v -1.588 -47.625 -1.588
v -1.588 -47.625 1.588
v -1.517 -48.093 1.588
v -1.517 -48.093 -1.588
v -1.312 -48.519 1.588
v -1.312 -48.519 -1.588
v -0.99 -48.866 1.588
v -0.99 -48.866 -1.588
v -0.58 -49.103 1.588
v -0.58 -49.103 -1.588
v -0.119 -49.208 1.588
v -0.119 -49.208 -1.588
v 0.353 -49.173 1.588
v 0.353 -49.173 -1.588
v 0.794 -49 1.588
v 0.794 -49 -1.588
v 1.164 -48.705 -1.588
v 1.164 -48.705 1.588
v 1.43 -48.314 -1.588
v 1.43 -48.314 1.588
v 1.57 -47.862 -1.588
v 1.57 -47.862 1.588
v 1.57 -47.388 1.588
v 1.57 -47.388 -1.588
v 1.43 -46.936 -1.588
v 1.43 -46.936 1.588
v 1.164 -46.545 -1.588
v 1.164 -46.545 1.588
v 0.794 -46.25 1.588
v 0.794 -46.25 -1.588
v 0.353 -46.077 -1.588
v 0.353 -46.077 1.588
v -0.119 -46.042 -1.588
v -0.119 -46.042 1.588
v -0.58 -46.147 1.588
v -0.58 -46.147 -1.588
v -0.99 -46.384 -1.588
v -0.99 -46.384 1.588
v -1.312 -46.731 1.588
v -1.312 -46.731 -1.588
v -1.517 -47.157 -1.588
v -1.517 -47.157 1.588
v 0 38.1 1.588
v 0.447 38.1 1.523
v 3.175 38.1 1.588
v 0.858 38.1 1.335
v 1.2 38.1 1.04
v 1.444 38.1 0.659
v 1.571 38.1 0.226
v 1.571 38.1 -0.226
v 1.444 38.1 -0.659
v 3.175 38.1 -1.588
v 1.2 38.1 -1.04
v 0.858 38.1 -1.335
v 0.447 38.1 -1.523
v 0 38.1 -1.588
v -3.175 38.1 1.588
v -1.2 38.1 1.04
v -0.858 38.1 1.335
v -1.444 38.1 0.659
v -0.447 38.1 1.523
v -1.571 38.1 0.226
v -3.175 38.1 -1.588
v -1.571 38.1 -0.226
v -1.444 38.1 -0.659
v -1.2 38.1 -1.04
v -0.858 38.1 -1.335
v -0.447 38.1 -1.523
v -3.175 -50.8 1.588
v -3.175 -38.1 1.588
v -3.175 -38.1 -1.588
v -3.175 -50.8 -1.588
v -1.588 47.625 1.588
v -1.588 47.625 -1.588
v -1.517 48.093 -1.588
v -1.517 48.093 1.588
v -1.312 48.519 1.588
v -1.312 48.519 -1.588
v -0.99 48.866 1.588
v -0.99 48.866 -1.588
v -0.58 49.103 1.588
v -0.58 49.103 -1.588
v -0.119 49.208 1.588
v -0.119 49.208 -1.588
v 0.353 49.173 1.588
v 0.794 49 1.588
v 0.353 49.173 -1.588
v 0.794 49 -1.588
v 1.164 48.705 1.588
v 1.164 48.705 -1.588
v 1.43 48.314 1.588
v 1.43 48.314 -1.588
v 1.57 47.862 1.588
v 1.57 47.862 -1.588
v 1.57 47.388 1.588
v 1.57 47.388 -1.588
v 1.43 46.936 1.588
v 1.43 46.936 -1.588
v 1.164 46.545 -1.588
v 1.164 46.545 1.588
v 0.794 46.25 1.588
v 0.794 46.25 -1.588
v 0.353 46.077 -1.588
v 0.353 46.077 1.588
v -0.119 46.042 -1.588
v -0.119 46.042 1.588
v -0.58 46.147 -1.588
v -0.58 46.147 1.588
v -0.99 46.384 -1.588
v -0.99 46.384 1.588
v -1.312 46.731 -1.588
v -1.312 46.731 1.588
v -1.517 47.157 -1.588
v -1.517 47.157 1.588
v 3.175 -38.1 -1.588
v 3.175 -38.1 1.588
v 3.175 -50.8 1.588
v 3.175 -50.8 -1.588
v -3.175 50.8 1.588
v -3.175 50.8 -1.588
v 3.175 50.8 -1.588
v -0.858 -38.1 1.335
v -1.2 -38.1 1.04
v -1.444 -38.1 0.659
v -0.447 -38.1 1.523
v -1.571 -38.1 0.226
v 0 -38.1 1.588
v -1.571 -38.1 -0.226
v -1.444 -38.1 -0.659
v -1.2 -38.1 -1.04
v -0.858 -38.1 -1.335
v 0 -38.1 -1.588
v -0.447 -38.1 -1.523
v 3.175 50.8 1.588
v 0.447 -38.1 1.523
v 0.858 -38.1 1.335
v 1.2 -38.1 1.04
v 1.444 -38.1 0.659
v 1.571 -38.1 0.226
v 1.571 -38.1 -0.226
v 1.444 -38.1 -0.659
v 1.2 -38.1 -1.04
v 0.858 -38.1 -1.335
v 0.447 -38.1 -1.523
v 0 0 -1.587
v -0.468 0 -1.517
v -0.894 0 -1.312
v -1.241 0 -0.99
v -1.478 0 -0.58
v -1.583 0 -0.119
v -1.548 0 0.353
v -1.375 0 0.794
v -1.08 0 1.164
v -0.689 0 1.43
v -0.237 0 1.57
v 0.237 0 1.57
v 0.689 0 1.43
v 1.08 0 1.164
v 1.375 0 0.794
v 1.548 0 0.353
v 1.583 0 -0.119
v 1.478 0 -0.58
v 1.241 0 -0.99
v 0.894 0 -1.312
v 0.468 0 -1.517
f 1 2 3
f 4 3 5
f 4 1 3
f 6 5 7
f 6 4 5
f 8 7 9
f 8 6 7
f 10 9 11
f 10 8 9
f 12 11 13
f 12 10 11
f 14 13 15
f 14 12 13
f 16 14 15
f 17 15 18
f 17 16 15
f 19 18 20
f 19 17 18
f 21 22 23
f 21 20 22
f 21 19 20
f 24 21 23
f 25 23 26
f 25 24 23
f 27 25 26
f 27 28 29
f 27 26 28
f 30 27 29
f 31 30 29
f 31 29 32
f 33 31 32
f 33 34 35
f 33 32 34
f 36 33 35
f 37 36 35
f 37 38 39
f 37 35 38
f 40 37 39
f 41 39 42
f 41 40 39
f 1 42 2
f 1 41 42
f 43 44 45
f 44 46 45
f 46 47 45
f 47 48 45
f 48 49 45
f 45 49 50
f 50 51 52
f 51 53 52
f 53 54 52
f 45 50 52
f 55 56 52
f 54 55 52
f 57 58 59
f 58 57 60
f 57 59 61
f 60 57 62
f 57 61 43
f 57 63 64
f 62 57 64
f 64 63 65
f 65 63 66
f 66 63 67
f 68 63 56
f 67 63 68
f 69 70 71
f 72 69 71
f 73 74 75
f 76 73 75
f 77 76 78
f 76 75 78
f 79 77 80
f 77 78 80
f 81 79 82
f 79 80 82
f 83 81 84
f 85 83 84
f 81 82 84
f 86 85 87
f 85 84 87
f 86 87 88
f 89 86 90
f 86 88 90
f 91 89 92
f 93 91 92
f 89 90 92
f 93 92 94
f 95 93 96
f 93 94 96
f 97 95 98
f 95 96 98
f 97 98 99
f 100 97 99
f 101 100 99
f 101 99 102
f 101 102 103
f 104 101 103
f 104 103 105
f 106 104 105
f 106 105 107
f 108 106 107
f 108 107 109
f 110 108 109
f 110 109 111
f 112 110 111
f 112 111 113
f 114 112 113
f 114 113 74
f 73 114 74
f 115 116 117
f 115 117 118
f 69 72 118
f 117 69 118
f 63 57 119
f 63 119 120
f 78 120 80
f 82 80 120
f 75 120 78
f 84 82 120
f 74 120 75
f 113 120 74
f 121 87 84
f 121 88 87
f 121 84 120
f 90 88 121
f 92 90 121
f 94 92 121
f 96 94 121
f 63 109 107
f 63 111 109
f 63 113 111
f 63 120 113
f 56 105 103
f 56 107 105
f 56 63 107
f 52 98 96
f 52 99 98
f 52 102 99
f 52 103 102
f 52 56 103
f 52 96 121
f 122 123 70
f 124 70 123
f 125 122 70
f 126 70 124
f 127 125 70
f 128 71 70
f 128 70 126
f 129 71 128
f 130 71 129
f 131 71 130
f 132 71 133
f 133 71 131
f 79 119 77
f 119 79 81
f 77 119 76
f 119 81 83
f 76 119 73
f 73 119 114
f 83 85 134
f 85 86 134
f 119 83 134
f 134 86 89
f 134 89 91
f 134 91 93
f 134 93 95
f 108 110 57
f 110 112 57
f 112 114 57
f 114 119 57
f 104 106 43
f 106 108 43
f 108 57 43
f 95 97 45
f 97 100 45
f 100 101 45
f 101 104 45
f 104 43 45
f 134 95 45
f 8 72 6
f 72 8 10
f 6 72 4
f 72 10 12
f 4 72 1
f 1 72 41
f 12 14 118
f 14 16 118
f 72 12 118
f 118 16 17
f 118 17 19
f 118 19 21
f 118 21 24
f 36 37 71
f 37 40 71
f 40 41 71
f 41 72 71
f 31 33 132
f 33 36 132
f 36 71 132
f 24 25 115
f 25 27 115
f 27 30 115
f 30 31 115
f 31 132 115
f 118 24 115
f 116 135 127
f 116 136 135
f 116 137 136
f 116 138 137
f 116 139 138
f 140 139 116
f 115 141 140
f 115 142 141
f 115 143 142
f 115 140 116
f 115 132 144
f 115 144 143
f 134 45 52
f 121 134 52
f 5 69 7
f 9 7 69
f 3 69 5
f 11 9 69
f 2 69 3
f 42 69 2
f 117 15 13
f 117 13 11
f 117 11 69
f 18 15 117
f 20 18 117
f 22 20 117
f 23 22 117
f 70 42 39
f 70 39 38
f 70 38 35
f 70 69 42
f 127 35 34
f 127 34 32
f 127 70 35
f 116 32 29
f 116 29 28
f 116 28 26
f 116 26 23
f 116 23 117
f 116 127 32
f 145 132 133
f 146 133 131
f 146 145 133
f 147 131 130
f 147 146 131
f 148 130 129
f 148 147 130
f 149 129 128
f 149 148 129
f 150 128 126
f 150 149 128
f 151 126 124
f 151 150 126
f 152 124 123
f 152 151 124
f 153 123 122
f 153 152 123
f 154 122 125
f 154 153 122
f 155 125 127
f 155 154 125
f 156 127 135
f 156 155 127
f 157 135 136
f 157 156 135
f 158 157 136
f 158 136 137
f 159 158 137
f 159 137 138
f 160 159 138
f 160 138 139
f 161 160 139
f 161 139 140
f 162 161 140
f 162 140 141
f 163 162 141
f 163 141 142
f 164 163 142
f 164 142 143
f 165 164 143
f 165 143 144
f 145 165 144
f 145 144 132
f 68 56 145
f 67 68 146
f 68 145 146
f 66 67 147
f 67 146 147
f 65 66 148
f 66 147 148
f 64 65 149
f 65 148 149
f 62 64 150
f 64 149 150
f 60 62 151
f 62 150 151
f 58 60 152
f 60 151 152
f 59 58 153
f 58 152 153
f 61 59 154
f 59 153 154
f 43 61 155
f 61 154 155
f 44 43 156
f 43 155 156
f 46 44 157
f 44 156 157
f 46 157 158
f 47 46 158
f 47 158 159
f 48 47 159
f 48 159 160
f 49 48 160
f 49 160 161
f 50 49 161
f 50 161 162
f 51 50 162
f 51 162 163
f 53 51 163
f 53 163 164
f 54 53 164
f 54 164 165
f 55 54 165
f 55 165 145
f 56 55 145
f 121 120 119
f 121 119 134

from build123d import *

# Parameters (mm, degrees)
SKETCH1_R           = 1.5875
BOSS_EXTRUDE1_DEPTH = 38.1
SKETCH2_W           = 6.35
SKETCH2_H           = 3.175
BOSS_EXTRUDE2_DEPTH = 12.7
SKETCH3_R           = 1.5875
CUT_EXTRUDE1_DEPTH  = 51.998051433


with BuildPart() as part:
    # Sketch1 → Boss-Extrude1 (new body)
    with BuildSketch(Plane(origin=(0, 0, 0), x_dir=(1, 0, 0), z_dir=(0, 1, 0))):
        with Locations(Location((0, 0, 0), (0, 0, 90))):
            Circle(SKETCH1_R)
    boss_extrude1 = extrude(amount=BOSS_EXTRUDE1_DEPTH)

    # Sketch2 → Boss-Extrude2 (add)
    with BuildSketch(Plane(origin=(0, 38.1, 0), x_dir=(1, 0, 0), z_dir=(0, 1, 0))):
        Rectangle(SKETCH2_W, SKETCH2_H)
    boss_extrude2 = extrude(amount=BOSS_EXTRUDE2_DEPTH)

    # Sketch3 → Cut-Extrude1 (cut, through all)
    with BuildSketch(Plane(origin=(0, 0, -1.5875), x_dir=(-1, 0, 0), z_dir=(0, 0, -1))):
        with Locations((0, 47.625)):
            Circle(SKETCH3_R)
    cut_extrude1 = extrude(amount=-CUT_EXTRUDE1_DEPTH, mode=Mode.SUBTRACT)

    # Mirror1: Boss-Extrude1, Boss-Extrude2, Cut-Extrude1 across plane
    add(boss_extrude1.mirror(Plane.ZX))
    add(boss_extrude2.mirror(Plane.ZX))
    add(cut_extrude1.mirror(Plane.ZX), mode=Mode.SUBTRACT)


solid = part.part
